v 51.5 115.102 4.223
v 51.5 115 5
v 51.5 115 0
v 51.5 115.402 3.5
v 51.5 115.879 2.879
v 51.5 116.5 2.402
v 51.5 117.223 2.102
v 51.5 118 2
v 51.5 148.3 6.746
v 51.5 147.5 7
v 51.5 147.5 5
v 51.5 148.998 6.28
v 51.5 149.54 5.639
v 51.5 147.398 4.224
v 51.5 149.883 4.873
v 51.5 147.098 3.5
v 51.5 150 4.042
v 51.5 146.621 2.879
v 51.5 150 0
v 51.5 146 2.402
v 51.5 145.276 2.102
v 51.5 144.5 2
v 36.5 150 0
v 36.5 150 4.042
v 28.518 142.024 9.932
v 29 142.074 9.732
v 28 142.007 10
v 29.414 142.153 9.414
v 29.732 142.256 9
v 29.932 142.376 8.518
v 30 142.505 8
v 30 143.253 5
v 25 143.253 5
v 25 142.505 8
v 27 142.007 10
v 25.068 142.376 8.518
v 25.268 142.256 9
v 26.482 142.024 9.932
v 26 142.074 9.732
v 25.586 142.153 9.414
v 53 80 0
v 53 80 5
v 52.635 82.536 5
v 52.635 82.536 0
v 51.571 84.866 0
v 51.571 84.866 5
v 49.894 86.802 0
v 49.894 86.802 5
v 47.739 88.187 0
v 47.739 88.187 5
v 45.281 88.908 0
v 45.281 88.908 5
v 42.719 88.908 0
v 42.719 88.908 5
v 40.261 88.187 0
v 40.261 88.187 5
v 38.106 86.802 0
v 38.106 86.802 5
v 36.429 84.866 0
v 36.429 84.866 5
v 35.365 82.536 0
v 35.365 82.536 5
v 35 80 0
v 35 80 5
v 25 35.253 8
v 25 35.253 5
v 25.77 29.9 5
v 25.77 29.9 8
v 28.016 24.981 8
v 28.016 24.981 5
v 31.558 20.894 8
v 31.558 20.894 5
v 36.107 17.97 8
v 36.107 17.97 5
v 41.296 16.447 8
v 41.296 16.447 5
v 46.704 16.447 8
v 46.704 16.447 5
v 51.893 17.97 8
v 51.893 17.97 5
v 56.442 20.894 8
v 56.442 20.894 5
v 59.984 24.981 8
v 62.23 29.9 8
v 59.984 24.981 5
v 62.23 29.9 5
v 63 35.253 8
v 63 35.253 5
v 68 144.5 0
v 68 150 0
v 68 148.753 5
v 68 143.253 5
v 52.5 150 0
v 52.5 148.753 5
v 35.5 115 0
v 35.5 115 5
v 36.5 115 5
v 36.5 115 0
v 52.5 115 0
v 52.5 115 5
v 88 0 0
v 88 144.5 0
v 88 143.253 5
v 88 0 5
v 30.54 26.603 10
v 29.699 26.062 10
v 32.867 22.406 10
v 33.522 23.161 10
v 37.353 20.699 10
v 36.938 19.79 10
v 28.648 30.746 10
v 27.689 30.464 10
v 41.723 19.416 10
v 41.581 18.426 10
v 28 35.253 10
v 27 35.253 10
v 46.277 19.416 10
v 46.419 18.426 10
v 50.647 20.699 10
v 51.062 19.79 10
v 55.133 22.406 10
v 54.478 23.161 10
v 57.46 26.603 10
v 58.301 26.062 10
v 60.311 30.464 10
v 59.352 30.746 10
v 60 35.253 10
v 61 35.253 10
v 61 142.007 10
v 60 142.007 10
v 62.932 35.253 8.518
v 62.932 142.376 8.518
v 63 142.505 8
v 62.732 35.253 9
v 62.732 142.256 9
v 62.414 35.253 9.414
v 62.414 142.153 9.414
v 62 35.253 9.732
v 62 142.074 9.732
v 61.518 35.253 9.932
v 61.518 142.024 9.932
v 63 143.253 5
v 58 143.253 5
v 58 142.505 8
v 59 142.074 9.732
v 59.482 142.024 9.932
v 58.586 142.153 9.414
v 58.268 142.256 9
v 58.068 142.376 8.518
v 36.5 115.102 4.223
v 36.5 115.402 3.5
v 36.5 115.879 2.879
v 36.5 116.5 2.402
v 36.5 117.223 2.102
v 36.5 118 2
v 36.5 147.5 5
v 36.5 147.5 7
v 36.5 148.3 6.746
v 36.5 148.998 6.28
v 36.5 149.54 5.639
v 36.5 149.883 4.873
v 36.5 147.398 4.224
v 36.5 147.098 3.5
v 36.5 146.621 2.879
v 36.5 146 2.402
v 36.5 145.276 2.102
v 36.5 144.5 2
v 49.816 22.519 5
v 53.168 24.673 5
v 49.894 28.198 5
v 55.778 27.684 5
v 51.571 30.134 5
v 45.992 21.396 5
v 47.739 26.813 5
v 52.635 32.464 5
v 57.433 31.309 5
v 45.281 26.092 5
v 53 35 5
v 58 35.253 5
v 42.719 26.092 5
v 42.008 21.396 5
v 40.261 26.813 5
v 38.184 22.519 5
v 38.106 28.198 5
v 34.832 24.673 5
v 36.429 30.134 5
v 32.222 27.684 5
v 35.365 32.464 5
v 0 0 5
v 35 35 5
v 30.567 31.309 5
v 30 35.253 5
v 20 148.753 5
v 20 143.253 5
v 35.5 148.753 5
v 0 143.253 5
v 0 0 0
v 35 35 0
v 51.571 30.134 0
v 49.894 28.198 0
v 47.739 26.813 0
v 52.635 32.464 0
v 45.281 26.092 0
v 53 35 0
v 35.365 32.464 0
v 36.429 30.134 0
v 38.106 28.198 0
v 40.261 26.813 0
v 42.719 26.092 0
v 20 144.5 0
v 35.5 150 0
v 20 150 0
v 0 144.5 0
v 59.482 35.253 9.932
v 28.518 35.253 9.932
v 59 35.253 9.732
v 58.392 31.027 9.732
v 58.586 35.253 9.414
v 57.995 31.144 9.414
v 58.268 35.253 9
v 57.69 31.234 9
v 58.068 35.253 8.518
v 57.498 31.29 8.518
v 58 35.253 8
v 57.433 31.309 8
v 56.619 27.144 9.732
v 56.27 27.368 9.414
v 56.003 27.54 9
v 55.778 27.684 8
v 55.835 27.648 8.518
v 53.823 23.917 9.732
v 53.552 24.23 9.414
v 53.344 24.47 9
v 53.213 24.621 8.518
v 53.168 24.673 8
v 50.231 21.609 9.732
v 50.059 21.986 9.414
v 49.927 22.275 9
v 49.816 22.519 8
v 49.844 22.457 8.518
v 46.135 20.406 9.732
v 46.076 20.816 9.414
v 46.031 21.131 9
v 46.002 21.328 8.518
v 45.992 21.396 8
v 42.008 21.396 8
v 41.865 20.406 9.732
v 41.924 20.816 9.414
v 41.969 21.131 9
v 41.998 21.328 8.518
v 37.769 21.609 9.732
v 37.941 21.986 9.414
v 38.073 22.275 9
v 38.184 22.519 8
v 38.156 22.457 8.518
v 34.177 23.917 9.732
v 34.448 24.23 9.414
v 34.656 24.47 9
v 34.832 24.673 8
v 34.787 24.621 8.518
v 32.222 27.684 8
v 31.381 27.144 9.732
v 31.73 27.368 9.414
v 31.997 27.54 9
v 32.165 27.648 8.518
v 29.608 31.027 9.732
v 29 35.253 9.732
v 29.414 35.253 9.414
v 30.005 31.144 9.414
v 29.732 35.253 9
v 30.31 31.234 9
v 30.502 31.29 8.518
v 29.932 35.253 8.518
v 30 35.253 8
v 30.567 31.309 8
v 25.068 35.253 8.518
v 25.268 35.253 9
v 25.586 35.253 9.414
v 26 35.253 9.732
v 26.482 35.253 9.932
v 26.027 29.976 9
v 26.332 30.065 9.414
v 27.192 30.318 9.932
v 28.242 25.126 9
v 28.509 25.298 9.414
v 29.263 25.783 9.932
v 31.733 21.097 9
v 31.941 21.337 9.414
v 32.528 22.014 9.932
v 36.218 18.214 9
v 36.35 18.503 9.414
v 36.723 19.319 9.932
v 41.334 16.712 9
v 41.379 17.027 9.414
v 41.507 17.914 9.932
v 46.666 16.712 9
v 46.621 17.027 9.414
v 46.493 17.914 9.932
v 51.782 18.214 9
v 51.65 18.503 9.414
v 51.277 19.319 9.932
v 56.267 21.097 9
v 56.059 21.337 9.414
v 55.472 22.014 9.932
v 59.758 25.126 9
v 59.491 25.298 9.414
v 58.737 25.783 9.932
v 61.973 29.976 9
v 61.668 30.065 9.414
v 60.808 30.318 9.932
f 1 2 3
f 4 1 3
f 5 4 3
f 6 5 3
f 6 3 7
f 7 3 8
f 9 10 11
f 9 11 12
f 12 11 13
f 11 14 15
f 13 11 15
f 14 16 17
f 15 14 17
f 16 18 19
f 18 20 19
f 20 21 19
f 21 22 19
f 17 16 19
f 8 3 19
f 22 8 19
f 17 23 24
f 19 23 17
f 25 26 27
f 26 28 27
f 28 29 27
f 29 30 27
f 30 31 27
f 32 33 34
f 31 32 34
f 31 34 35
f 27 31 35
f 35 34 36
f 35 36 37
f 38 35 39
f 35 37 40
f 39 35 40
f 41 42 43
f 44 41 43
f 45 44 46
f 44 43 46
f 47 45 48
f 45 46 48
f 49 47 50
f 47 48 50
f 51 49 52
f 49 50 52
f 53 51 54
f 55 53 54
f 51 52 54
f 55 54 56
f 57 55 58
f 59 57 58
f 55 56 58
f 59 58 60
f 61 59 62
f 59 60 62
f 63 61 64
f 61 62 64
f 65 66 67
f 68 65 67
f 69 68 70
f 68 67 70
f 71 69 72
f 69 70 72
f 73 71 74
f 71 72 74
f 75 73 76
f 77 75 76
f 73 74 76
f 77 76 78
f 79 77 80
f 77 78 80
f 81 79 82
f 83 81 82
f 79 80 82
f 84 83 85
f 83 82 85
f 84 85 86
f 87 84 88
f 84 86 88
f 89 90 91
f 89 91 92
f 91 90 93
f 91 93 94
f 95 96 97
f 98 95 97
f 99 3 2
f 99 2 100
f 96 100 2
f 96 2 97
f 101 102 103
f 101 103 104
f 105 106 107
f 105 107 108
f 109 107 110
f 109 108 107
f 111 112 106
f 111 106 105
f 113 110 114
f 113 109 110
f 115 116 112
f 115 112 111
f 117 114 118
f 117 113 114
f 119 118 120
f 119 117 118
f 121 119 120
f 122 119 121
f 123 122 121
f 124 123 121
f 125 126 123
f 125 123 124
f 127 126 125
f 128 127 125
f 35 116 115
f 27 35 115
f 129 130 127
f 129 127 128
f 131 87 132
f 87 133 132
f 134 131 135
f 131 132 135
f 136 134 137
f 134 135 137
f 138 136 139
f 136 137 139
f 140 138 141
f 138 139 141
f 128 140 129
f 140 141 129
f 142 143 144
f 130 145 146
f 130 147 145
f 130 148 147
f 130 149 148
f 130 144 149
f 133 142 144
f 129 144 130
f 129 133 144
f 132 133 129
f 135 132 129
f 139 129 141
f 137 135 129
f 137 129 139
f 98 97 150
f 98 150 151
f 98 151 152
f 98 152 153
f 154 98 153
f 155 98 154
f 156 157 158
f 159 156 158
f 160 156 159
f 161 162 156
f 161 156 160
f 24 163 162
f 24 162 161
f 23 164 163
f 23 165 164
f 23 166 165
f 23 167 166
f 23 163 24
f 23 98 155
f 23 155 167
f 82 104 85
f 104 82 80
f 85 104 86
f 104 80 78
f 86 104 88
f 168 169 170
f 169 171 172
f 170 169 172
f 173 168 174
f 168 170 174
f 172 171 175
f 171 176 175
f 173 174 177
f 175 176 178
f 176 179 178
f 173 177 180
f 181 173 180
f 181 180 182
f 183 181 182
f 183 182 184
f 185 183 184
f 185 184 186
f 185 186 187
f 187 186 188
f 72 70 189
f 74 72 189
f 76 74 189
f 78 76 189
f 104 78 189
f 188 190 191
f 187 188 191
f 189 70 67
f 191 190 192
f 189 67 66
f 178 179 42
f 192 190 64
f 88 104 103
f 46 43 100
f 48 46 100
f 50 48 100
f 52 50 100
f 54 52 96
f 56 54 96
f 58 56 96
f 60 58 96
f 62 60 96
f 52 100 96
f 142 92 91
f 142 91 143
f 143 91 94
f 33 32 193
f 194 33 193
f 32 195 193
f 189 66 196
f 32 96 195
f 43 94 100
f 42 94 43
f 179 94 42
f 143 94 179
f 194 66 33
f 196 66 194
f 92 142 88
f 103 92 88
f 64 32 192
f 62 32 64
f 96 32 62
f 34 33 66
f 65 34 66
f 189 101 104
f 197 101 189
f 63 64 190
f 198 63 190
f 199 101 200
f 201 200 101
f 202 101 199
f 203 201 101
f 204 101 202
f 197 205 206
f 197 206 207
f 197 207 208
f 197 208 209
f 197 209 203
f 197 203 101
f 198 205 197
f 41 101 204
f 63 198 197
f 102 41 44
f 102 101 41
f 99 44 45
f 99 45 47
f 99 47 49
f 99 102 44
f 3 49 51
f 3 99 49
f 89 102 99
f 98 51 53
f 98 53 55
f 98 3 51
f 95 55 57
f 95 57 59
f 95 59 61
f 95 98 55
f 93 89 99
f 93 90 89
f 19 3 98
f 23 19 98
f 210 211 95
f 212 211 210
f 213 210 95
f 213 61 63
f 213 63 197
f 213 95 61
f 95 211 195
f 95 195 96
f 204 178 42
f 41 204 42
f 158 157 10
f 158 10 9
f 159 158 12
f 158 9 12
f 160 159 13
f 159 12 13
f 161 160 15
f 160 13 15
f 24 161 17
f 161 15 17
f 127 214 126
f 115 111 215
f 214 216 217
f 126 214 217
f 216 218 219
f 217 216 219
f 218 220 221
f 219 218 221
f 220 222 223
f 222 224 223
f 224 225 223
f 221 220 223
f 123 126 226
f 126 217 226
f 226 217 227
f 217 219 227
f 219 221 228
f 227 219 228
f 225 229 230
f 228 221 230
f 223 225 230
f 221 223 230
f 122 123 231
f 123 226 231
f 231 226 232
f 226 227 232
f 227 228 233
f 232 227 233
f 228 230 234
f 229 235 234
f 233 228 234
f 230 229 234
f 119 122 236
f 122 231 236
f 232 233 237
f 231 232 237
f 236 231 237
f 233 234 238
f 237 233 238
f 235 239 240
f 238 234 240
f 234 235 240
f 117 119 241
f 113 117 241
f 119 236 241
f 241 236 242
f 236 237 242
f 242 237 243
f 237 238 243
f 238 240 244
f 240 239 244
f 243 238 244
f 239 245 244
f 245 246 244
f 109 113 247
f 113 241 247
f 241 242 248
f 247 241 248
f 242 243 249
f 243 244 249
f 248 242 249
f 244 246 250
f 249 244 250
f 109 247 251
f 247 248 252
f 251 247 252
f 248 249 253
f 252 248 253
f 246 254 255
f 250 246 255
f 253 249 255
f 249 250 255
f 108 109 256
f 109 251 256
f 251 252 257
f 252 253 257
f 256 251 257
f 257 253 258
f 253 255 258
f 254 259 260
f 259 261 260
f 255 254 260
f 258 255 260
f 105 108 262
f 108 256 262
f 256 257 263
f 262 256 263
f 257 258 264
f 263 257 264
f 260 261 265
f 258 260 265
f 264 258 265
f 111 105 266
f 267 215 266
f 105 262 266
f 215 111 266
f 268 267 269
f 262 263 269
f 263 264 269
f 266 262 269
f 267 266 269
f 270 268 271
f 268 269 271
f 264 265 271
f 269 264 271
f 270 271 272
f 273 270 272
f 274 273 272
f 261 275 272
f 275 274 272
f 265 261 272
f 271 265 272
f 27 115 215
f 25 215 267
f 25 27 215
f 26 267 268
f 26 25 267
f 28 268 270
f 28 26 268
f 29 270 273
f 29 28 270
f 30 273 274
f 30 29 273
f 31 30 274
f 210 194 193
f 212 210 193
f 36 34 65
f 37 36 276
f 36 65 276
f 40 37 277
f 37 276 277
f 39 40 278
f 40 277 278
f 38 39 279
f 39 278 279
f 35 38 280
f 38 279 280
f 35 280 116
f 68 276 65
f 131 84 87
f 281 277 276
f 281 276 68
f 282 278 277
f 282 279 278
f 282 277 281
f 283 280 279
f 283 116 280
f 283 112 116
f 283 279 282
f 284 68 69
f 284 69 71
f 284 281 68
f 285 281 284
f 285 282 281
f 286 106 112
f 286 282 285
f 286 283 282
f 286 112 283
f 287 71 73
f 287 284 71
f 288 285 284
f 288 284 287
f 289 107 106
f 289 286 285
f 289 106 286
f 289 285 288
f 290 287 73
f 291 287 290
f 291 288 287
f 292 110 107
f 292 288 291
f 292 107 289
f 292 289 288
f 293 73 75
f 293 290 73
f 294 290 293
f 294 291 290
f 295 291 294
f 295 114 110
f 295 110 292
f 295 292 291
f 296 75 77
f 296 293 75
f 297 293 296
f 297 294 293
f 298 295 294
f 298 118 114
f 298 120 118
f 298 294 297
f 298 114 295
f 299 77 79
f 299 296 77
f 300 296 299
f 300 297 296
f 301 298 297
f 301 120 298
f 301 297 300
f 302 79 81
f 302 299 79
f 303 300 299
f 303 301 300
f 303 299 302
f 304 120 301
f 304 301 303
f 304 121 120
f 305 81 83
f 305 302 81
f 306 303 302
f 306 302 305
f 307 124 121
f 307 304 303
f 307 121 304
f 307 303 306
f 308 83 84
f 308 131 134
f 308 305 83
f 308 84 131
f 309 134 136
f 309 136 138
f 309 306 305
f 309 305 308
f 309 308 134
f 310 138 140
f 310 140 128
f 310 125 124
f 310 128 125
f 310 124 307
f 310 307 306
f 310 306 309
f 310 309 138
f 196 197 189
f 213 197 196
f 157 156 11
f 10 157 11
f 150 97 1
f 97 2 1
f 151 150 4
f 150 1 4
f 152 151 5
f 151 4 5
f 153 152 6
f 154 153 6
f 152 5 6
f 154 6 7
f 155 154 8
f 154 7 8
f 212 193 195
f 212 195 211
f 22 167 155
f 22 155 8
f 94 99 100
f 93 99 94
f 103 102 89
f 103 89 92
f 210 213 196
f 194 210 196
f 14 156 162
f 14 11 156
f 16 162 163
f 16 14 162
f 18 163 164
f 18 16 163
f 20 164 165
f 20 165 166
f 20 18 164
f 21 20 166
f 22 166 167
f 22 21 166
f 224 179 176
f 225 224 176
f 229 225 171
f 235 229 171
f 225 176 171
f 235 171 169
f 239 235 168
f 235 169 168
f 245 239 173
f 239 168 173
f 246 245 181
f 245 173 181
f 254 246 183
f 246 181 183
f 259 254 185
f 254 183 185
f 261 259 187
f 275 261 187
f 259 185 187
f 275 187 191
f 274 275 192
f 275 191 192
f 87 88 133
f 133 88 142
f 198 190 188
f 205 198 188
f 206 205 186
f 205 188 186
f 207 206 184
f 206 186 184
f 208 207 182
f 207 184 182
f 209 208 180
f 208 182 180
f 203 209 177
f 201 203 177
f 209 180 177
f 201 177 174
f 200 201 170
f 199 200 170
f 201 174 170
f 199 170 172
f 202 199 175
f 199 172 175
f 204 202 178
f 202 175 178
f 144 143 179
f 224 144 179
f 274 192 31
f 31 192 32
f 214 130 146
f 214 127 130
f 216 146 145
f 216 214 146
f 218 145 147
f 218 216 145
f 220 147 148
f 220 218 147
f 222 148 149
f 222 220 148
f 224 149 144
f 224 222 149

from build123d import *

# Parameters (mm, degrees)
BOSS_EXTRUDE1_DEPTH = 5
CUT_EXTRUDE1_DEPTH  = 20
CUT_EXTRUDE2_DEPTH  = 20
CUT_EXTRUDE3_DEPTH  = 15.5
CUT_EXTRUDE4_DEPTH  = 15.5
SKETCH6_W           = 15
SKETCH6_H           = 32.5
CUT_EXTRUDE5_DEPTH  = 3
FILLET1_R           = 3
SKETCH7_W           = 15
SKETCH7_H           = 2.5
BOSS_EXTRUDE2_DEPTH = 2
FILLET2_R           = 3
FILLET3_R           = 3
CUT_EXTRUDE6_DEPTH  = 5
BOSS_EXTRUDE3_DEPTH = 5
CUT_EXTRUDE7_DEPTH  = 5
CUT_EXTRUDE8_DEPTH  = 5
FILLET4_R           = 2
FILLET5_R           = 2


# Some blends are built 0.0001 mm under size
with BuildPart() as part:
    # Sketch1 → Boss-Extrude1 (new body)
    with BuildSketch(Plane.XY):
        Polygon((0, 0), (0, 144.5), (20, 144.5), (20, 150), (35.5, 150), (35.5, 115), (36.5, 115), (36.5, 150), (51.5, 150), (51.5, 115), (52.5, 115), (52.5, 150), (68, 150), (68, 144.5), (88, 144.5), (88, 0), align=None)
    extrude(amount=BOSS_EXTRUDE1_DEPTH)

    # Sketch2 → Cut-Extrude1 (cut)
    with BuildSketch(Plane(origin=(88, 0, 0), x_dir=(0, 0, -1), z_dir=(1, 0, 0))):
        Polygon((-5, 144.5), (0, 144.5), (-5, 143.253359986), align=None)
    extrude(amount=-CUT_EXTRUDE1_DEPTH, mode=Mode.SUBTRACT)

    # Sketch3 → Cut-Extrude2 (cut)
    with BuildSketch(Plane.ZY):
        Polygon((5, 144.5), (0, 144.5), (5, 143.253359986), align=None)
    extrude(amount=-CUT_EXTRUDE2_DEPTH, mode=Mode.SUBTRACT)

    # Sketch4 → Cut-Extrude3 (cut)
    with BuildSketch(Plane(origin=(68, 0, 0), x_dir=(0, 0, -1), z_dir=(1, 0, 0))):
        Polygon((0, 150), (-5, 148.753359986), (-5, 150), align=None)
    extrude(amount=-CUT_EXTRUDE3_DEPTH, mode=Mode.SUBTRACT)

    # Sketch5 → Cut-Extrude4 (cut)
    with BuildSketch(Plane.ZY.offset(-20)):
        Polygon((0, 150), (5, 150), (5, 148.753359986), align=None)
    extrude(amount=-CUT_EXTRUDE4_DEPTH, mode=Mode.SUBTRACT)

    # Sketch6 → Cut-Extrude5 (cut)
    with BuildSketch(Plane.XY.offset(5)):
        with Locations((44, 131.25)):
            Rectangle(SKETCH6_W, SKETCH6_H)
    extrude(amount=-CUT_EXTRUDE5_DEPTH, mode=Mode.SUBTRACT)

    # Fillet1
    fillet1_edges = [part.edges().sort_by_distance(p)[0] for p in [
        (44, 115, 2),
    ]]
    fillet(fillet1_edges, radius=FILLET1_R - 0.0001)  # a hair under: the kernel refuses the full size

    # Sketch7 → Boss-Extrude2 (add)
    with BuildSketch(Plane.XY.offset(5)):
        with Locations((44, 148.75)):
            Rectangle(SKETCH7_W, SKETCH7_H)
    extrude(amount=BOSS_EXTRUDE2_DEPTH)

    # Fillet2
    fillet2_edges = [part.edges().sort_by_distance(p)[0] for p in [
        (44, 147.5, 2),
    ]]
    fillet(fillet2_edges, radius=FILLET2_R)

    # Fillet3
    # the kernel refuses this fillet: 3 mm, written as the material it takes off along each edge
    with BuildSketch(Plane(origin=(58.895099729, 150, 7), x_dir=(0, -1, 0), z_dir=(-1, 0, 0))) as fillet3_piece_1:
        with BuildLine():
            CenterArc((3, -2.958039892), FILLET3_R, 99.594068227, 80.405931773)
            Line((0, -2.958039892), (-0.06, -2.958039892))
            Line((-0.06, -2.958039892), (-0.06, 0))
            Line((-0.06, 0), (0, 0.06))
            ThreePointArc((0, 0.06), (1.25, 0.06), (2.49, 0.059160798))
            Line((2.49, 0.059160798), (2.5, 0))
        make_face()
    extrude(amount=29.790199458, mode=Mode.SUBTRACT)

    # Sketch8 → Cut-Extrude6 (cut)
    with BuildSketch(Plane.XY.offset(5)):
        with BuildLine():
            Line((35, 80), (35, 35))
            ThreePointArc((35, 35), (44, 26), (53, 35))
            Line((53, 35), (53, 80))
            ThreePointArc((53, 80), (44, 89), (35, 80))
        make_face()
    extrude(amount=-CUT_EXTRUDE6_DEPTH, mode=Mode.SUBTRACT)

    # Sketch9 → Boss-Extrude3 (add)
    with BuildSketch(Plane.XY.offset(5)):
        with BuildLine():
            Line((25, 143.253359986), (25, 35.253359986))
            ThreePointArc((25, 35.253359986), (44, 16.253359986), (63, 35.253359986))
            Line((63, 35.253359986), (63, 143.253359986))
            Line((63, 143.253359986), (58, 143.253359986))
            Line((58, 143.253359986), (58, 35.253359986))
            ThreePointArc((58, 35.253359986), (44, 21.253359986), (30, 35.253359986))
            Line((30, 35.253359986), (30, 143.253359986))
            Line((30, 143.253359986), (25, 143.253359986))
        make_face()
    extrude(amount=BOSS_EXTRUDE3_DEPTH)

    # Sketch10 → Cut-Extrude7 (cut)
    with BuildSketch(Plane.ZY.offset(-25)):
        Polygon((5, 143.253359986), (10, 142.006719972), (10, 143.253359986), align=None)
    extrude(amount=-CUT_EXTRUDE7_DEPTH, mode=Mode.SUBTRACT)

    # Sketch11 → Cut-Extrude8 (cut)
    with BuildSketch(Plane(origin=(63, 0, 0), x_dir=(0, 0, -1), z_dir=(1, 0, 0))):
        Polygon((-5, 143.253359986), (-10, 142.006719972), (-10, 143.253359986), align=None)
    extrude(amount=-CUT_EXTRUDE8_DEPTH, mode=Mode.SUBTRACT)

    # Fillet4
    fillet4_edges = [part.edges().sort_by_distance(p)[0] for p in [
        (44, 16.253359986, 10),
        (63, 88.630039979, 10),
        (25, 88.630039979, 10),
    ]]
    fillet(fillet4_edges, radius=FILLET4_R)

    # Fillet5
    fillet5_edges = [part.edges().sort_by_distance(p)[0] for p in [
        (44, 21.253359986, 10),
        (30, 88.630039979, 10),
        (58, 88.630039979, 10),
    ]]
    fillet(fillet5_edges, radius=FILLET5_R)


solid = part.part
